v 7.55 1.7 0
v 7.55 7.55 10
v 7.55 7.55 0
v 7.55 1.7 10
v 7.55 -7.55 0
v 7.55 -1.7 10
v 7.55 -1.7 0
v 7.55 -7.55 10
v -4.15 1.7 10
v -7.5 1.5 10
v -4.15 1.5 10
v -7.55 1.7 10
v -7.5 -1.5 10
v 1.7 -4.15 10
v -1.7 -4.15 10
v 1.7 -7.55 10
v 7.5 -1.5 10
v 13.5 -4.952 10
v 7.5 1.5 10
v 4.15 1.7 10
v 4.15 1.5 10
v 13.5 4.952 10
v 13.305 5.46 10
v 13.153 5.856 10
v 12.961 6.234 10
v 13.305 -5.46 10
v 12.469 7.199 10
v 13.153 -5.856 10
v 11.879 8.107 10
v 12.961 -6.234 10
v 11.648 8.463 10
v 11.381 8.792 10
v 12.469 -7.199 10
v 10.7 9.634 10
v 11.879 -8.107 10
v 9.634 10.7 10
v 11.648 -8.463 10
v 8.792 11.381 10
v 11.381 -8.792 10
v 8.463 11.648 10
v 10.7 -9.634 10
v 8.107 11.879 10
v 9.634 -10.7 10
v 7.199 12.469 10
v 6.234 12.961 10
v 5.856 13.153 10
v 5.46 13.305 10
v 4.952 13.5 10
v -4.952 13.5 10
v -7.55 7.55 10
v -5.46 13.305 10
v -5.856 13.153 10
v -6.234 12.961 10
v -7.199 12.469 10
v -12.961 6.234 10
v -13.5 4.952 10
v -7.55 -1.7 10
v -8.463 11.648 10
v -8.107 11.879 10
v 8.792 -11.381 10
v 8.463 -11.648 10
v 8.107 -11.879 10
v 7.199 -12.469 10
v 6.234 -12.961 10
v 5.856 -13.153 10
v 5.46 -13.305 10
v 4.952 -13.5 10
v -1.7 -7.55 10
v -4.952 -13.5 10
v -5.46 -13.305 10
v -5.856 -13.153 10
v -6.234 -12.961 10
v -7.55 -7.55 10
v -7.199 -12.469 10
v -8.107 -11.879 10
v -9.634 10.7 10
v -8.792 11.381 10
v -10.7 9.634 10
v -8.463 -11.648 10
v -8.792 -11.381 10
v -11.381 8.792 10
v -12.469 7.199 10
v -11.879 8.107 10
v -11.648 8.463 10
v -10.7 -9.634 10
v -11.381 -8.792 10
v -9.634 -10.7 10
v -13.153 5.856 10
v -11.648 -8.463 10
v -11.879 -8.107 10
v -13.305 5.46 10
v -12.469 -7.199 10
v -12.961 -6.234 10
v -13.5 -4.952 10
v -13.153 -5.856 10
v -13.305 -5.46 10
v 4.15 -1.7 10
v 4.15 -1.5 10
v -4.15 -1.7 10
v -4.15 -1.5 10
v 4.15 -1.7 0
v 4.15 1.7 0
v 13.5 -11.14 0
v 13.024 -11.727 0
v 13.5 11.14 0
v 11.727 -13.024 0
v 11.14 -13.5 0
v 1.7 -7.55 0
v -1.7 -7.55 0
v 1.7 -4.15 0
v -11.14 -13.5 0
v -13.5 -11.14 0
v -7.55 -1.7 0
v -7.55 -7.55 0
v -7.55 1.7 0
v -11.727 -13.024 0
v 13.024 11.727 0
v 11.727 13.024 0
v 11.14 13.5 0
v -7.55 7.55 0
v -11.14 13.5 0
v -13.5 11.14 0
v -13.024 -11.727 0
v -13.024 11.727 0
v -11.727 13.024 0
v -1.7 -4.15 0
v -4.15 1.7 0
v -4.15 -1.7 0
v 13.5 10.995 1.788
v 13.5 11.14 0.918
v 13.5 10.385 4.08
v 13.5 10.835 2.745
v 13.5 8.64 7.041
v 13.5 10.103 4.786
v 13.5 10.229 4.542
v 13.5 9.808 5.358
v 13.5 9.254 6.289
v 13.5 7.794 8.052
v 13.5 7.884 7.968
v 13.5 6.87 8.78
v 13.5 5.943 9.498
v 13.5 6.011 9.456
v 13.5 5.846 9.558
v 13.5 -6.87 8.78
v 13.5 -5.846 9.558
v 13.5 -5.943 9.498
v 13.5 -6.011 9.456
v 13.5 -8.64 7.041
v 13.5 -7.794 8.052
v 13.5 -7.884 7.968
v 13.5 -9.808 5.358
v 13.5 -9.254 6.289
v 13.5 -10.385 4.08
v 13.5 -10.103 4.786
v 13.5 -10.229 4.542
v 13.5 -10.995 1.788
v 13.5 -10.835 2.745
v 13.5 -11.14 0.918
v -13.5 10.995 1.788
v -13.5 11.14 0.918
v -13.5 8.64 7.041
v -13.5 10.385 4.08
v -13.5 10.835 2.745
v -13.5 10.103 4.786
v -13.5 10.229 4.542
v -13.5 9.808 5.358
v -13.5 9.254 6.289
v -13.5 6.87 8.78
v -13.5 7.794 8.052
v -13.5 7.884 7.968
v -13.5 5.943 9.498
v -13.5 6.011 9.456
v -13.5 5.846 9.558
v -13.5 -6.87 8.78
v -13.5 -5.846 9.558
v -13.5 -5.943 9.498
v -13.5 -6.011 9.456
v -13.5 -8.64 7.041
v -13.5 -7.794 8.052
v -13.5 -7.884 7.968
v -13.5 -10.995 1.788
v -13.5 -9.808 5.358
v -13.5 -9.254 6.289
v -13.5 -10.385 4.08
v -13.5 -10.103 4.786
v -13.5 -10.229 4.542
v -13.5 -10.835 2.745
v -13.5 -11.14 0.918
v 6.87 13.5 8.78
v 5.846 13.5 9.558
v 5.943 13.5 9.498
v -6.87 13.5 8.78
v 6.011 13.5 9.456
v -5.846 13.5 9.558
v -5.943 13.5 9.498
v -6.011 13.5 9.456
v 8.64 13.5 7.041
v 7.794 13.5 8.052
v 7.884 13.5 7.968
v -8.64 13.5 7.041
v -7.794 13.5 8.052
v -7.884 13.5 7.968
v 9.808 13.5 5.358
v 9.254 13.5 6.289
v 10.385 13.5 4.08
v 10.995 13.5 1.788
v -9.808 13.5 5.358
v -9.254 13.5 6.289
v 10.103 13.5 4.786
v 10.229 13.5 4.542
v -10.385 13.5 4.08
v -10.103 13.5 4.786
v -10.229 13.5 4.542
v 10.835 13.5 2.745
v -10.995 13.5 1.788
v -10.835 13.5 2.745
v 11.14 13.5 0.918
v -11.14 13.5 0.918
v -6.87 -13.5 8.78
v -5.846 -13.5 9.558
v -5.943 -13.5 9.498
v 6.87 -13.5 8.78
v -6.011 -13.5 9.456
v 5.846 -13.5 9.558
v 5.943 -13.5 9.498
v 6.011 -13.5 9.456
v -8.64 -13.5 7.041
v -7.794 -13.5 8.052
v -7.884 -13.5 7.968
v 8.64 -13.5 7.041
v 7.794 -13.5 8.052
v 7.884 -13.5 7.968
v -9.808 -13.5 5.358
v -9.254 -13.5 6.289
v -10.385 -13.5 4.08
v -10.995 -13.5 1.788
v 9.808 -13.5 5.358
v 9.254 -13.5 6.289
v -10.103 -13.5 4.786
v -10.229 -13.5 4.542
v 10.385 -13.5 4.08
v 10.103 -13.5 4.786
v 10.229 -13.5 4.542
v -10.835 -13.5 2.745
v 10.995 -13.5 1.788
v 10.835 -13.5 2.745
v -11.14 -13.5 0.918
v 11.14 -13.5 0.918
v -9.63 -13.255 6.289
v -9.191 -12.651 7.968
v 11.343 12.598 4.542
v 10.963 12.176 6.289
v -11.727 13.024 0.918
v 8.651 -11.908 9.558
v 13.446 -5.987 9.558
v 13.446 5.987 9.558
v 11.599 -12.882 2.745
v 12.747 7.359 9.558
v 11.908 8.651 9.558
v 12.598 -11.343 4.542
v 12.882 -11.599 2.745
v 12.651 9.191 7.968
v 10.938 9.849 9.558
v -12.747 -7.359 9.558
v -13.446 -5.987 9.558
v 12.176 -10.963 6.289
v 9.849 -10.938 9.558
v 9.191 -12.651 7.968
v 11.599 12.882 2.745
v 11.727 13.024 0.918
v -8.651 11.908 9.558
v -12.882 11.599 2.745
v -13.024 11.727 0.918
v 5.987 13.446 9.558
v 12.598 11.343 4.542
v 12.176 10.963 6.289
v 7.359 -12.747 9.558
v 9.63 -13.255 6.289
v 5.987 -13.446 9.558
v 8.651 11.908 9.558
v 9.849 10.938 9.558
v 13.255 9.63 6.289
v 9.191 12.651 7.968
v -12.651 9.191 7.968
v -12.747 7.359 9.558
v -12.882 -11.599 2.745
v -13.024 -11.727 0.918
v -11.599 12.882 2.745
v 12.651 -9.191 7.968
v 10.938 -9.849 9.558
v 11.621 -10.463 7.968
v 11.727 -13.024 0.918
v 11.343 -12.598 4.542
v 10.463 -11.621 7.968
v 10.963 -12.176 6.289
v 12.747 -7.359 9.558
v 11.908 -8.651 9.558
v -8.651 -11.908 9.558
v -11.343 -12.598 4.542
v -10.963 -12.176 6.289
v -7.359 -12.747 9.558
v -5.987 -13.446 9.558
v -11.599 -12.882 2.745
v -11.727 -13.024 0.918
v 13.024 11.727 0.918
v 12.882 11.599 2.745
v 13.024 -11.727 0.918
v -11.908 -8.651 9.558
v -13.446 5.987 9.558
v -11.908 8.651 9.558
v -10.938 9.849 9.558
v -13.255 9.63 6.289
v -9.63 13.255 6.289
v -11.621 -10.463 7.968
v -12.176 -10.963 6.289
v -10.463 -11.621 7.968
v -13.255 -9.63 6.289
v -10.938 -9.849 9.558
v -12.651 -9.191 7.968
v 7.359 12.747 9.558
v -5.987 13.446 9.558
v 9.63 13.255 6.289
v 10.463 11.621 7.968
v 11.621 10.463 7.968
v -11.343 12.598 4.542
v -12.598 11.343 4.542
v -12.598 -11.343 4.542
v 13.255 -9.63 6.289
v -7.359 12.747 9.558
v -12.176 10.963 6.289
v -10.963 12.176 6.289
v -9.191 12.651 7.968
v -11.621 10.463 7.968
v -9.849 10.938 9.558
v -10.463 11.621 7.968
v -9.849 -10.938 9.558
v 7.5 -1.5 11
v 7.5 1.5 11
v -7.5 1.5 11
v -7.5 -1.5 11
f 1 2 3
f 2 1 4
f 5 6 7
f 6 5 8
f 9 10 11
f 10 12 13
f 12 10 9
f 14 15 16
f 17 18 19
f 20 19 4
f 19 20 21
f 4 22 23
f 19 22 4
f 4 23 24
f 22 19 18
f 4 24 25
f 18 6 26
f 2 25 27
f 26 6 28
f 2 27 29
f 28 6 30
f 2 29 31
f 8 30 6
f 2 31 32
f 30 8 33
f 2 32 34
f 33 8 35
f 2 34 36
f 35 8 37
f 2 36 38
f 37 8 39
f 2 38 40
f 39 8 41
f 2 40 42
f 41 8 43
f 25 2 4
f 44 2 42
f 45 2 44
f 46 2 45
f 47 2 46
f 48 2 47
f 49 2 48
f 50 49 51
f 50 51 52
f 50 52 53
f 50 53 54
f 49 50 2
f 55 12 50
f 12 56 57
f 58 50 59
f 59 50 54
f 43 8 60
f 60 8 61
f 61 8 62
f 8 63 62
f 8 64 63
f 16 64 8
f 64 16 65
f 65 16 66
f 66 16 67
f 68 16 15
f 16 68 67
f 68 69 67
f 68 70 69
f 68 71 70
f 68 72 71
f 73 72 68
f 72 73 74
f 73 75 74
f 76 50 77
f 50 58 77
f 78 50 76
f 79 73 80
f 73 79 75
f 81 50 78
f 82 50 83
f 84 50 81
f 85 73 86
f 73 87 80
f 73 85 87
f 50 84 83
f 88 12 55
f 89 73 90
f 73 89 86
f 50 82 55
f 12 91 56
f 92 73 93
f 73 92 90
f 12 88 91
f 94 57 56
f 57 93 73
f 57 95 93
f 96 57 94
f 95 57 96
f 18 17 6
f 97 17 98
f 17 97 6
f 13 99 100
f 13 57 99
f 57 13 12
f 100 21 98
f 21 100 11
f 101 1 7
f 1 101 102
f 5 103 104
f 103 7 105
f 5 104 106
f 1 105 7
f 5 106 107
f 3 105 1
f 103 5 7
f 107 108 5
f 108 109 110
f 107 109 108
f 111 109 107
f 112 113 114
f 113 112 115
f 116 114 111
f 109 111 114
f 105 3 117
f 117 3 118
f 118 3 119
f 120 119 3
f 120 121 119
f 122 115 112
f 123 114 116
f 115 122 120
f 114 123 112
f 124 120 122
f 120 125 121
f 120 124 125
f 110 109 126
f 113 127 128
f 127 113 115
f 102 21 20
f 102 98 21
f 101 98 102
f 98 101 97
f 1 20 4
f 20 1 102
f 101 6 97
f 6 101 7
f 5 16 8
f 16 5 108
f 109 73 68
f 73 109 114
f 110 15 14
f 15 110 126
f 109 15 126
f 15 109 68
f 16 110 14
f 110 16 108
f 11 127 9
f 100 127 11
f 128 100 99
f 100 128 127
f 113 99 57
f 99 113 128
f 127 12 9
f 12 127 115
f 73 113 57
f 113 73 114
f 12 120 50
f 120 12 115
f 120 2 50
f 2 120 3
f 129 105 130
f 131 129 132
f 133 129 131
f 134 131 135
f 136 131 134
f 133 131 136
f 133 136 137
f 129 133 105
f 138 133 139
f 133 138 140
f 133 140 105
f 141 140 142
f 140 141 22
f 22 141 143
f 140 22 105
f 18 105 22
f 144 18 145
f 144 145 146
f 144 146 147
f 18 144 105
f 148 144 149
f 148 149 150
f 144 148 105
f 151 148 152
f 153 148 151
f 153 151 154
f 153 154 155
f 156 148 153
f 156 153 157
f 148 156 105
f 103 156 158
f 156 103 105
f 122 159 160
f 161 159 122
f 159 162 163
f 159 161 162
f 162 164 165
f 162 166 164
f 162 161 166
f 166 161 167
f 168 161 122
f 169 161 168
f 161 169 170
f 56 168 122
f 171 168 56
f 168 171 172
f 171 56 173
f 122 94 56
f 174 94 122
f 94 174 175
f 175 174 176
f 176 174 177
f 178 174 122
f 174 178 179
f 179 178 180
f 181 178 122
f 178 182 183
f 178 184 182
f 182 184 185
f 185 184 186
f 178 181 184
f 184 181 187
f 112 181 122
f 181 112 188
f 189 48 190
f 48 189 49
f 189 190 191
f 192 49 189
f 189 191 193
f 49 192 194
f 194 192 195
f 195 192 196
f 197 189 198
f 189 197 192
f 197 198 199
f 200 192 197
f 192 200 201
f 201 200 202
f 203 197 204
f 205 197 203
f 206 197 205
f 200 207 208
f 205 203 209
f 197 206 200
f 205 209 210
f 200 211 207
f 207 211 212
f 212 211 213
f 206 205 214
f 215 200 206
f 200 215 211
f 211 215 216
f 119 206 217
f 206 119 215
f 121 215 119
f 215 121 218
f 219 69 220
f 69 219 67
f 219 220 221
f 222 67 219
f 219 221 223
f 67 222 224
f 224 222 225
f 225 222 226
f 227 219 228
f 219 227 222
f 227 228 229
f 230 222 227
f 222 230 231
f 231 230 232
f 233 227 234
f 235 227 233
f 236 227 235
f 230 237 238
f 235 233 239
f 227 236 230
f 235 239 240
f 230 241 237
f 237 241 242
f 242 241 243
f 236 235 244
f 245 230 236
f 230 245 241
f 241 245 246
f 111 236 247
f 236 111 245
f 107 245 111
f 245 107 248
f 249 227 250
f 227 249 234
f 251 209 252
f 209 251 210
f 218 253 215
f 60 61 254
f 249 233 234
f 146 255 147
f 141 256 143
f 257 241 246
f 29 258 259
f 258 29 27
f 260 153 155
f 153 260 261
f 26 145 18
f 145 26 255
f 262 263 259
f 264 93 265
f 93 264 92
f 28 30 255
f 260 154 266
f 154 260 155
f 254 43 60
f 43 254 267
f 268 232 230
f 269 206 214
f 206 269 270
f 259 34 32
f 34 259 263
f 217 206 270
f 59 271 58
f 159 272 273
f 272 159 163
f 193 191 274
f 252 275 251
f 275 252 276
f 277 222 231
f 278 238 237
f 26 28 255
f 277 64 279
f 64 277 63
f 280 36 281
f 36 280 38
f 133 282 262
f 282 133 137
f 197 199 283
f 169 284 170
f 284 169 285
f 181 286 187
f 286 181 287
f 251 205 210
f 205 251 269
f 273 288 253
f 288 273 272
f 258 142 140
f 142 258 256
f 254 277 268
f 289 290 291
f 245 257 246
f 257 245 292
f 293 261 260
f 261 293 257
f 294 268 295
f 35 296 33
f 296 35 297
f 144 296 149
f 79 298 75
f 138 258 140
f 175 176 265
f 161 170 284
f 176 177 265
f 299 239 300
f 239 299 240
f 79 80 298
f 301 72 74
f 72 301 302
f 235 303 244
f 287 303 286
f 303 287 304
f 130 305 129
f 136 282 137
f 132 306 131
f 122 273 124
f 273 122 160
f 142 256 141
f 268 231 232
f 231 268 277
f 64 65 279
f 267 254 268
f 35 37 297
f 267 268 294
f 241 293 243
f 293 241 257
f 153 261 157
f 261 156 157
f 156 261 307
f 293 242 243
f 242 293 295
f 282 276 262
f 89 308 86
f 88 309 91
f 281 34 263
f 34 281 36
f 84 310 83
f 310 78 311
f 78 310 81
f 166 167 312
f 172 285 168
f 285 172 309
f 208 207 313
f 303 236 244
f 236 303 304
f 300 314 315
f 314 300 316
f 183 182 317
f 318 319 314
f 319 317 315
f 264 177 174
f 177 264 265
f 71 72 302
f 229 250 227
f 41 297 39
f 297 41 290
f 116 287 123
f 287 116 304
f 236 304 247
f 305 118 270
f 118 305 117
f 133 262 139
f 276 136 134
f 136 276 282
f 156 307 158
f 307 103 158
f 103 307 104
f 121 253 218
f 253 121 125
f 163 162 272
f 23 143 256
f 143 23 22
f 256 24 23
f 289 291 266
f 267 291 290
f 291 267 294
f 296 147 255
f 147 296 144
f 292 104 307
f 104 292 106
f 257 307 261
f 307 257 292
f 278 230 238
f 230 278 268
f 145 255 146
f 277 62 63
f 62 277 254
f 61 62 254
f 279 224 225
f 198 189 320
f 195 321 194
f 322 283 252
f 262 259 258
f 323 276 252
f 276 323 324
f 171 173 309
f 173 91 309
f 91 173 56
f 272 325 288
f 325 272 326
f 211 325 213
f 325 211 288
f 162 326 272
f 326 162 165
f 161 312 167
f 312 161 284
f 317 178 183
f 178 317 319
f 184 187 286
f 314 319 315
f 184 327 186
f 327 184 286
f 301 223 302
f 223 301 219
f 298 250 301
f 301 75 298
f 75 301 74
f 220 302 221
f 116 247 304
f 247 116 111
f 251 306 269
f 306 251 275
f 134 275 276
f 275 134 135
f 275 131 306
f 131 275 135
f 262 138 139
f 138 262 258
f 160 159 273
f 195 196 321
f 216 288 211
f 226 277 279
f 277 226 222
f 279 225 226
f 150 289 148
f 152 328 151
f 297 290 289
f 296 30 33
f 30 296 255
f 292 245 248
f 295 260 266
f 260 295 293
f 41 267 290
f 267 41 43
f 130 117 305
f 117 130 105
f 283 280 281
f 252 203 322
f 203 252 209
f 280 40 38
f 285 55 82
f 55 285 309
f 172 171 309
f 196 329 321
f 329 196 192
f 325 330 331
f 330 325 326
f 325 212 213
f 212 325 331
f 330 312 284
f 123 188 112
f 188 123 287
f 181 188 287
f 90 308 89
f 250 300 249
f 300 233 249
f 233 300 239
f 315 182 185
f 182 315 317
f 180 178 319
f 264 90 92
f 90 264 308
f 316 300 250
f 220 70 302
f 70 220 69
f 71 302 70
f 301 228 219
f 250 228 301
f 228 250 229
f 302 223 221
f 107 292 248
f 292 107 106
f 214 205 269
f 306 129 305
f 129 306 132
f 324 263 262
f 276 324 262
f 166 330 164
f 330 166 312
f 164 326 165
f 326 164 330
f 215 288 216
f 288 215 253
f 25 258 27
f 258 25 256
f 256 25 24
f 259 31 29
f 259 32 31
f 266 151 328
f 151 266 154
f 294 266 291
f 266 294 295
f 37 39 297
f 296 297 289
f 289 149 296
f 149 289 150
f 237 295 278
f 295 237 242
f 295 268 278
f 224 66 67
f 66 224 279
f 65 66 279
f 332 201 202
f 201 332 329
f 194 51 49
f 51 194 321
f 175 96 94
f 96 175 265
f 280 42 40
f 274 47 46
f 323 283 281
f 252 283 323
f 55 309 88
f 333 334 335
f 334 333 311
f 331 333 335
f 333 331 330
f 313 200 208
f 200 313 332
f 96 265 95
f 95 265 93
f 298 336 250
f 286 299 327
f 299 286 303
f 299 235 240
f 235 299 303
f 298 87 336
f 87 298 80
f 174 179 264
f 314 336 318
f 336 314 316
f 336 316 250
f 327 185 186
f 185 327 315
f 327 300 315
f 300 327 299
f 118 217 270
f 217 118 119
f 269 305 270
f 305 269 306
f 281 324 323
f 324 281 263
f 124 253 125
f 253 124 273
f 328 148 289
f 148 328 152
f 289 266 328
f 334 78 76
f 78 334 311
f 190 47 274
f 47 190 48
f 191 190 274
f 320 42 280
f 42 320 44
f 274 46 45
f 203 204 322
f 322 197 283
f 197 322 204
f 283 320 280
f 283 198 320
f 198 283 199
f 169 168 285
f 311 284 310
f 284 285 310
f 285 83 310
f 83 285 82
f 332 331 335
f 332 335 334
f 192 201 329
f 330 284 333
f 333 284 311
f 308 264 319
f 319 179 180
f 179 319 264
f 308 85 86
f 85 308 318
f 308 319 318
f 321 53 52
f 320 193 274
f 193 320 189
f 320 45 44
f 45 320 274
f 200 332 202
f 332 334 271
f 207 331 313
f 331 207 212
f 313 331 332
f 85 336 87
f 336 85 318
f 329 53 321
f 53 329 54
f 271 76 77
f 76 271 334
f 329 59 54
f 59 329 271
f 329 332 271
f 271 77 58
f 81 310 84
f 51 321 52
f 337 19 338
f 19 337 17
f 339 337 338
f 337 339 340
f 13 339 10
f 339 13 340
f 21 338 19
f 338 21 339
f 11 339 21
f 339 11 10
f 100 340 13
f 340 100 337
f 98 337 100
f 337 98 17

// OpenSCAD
//This is based off of http://www.thingiverse.com/thing:289910




m3_nut_od = 6.2;
m3_nut_radius = m3_nut_od/2;
m3_major = 2.8;
m3_radius = m3_major/2 ;
m3_wide_radius = m3_major/2;

num40_drill = 2.4/2;    // for tapping

slide_h = 10;
slide_l = 27;//29; //15+13+5
slide_w = 27;

psaver_w = 9;
psaver_l = 13;
psaver_o = 1;

front_h = 13; // want to match the height of a linear rail MGN12C

extrusion_w =15.1;
extrusion_slot_w = 3.4;
extrusion_offset = 0;

screw_offset = 15;

$fn=60;



FingerWidth = 2.5;
FingerTolerance = .3;





translate([0,0,10.5]) cube([15, 3, 1], true);
%translate([0,0,10.5]) cube([3, 15, 1], true);

intersection()
{

//main block
translate([0,extrusion_offset,slide_h/2])
 difference(){

   cube([slide_w, slide_l,slide_h],center=true);
   
   translate([0,-extrusion_offset,0]) union(){
    difference(){
     cube([extrusion_w, extrusion_w,slide_h+2],center=true);
     for(an = [0: 2]) 
      rotate(an*-90)translate([(extrusion_w-extrusion_slot_w)/2,0,0])cube([extrusion_slot_w,extrusion_slot_w,slide_h],center=true);
    }
    
   }

}


sphere(r=27*.65);
}
